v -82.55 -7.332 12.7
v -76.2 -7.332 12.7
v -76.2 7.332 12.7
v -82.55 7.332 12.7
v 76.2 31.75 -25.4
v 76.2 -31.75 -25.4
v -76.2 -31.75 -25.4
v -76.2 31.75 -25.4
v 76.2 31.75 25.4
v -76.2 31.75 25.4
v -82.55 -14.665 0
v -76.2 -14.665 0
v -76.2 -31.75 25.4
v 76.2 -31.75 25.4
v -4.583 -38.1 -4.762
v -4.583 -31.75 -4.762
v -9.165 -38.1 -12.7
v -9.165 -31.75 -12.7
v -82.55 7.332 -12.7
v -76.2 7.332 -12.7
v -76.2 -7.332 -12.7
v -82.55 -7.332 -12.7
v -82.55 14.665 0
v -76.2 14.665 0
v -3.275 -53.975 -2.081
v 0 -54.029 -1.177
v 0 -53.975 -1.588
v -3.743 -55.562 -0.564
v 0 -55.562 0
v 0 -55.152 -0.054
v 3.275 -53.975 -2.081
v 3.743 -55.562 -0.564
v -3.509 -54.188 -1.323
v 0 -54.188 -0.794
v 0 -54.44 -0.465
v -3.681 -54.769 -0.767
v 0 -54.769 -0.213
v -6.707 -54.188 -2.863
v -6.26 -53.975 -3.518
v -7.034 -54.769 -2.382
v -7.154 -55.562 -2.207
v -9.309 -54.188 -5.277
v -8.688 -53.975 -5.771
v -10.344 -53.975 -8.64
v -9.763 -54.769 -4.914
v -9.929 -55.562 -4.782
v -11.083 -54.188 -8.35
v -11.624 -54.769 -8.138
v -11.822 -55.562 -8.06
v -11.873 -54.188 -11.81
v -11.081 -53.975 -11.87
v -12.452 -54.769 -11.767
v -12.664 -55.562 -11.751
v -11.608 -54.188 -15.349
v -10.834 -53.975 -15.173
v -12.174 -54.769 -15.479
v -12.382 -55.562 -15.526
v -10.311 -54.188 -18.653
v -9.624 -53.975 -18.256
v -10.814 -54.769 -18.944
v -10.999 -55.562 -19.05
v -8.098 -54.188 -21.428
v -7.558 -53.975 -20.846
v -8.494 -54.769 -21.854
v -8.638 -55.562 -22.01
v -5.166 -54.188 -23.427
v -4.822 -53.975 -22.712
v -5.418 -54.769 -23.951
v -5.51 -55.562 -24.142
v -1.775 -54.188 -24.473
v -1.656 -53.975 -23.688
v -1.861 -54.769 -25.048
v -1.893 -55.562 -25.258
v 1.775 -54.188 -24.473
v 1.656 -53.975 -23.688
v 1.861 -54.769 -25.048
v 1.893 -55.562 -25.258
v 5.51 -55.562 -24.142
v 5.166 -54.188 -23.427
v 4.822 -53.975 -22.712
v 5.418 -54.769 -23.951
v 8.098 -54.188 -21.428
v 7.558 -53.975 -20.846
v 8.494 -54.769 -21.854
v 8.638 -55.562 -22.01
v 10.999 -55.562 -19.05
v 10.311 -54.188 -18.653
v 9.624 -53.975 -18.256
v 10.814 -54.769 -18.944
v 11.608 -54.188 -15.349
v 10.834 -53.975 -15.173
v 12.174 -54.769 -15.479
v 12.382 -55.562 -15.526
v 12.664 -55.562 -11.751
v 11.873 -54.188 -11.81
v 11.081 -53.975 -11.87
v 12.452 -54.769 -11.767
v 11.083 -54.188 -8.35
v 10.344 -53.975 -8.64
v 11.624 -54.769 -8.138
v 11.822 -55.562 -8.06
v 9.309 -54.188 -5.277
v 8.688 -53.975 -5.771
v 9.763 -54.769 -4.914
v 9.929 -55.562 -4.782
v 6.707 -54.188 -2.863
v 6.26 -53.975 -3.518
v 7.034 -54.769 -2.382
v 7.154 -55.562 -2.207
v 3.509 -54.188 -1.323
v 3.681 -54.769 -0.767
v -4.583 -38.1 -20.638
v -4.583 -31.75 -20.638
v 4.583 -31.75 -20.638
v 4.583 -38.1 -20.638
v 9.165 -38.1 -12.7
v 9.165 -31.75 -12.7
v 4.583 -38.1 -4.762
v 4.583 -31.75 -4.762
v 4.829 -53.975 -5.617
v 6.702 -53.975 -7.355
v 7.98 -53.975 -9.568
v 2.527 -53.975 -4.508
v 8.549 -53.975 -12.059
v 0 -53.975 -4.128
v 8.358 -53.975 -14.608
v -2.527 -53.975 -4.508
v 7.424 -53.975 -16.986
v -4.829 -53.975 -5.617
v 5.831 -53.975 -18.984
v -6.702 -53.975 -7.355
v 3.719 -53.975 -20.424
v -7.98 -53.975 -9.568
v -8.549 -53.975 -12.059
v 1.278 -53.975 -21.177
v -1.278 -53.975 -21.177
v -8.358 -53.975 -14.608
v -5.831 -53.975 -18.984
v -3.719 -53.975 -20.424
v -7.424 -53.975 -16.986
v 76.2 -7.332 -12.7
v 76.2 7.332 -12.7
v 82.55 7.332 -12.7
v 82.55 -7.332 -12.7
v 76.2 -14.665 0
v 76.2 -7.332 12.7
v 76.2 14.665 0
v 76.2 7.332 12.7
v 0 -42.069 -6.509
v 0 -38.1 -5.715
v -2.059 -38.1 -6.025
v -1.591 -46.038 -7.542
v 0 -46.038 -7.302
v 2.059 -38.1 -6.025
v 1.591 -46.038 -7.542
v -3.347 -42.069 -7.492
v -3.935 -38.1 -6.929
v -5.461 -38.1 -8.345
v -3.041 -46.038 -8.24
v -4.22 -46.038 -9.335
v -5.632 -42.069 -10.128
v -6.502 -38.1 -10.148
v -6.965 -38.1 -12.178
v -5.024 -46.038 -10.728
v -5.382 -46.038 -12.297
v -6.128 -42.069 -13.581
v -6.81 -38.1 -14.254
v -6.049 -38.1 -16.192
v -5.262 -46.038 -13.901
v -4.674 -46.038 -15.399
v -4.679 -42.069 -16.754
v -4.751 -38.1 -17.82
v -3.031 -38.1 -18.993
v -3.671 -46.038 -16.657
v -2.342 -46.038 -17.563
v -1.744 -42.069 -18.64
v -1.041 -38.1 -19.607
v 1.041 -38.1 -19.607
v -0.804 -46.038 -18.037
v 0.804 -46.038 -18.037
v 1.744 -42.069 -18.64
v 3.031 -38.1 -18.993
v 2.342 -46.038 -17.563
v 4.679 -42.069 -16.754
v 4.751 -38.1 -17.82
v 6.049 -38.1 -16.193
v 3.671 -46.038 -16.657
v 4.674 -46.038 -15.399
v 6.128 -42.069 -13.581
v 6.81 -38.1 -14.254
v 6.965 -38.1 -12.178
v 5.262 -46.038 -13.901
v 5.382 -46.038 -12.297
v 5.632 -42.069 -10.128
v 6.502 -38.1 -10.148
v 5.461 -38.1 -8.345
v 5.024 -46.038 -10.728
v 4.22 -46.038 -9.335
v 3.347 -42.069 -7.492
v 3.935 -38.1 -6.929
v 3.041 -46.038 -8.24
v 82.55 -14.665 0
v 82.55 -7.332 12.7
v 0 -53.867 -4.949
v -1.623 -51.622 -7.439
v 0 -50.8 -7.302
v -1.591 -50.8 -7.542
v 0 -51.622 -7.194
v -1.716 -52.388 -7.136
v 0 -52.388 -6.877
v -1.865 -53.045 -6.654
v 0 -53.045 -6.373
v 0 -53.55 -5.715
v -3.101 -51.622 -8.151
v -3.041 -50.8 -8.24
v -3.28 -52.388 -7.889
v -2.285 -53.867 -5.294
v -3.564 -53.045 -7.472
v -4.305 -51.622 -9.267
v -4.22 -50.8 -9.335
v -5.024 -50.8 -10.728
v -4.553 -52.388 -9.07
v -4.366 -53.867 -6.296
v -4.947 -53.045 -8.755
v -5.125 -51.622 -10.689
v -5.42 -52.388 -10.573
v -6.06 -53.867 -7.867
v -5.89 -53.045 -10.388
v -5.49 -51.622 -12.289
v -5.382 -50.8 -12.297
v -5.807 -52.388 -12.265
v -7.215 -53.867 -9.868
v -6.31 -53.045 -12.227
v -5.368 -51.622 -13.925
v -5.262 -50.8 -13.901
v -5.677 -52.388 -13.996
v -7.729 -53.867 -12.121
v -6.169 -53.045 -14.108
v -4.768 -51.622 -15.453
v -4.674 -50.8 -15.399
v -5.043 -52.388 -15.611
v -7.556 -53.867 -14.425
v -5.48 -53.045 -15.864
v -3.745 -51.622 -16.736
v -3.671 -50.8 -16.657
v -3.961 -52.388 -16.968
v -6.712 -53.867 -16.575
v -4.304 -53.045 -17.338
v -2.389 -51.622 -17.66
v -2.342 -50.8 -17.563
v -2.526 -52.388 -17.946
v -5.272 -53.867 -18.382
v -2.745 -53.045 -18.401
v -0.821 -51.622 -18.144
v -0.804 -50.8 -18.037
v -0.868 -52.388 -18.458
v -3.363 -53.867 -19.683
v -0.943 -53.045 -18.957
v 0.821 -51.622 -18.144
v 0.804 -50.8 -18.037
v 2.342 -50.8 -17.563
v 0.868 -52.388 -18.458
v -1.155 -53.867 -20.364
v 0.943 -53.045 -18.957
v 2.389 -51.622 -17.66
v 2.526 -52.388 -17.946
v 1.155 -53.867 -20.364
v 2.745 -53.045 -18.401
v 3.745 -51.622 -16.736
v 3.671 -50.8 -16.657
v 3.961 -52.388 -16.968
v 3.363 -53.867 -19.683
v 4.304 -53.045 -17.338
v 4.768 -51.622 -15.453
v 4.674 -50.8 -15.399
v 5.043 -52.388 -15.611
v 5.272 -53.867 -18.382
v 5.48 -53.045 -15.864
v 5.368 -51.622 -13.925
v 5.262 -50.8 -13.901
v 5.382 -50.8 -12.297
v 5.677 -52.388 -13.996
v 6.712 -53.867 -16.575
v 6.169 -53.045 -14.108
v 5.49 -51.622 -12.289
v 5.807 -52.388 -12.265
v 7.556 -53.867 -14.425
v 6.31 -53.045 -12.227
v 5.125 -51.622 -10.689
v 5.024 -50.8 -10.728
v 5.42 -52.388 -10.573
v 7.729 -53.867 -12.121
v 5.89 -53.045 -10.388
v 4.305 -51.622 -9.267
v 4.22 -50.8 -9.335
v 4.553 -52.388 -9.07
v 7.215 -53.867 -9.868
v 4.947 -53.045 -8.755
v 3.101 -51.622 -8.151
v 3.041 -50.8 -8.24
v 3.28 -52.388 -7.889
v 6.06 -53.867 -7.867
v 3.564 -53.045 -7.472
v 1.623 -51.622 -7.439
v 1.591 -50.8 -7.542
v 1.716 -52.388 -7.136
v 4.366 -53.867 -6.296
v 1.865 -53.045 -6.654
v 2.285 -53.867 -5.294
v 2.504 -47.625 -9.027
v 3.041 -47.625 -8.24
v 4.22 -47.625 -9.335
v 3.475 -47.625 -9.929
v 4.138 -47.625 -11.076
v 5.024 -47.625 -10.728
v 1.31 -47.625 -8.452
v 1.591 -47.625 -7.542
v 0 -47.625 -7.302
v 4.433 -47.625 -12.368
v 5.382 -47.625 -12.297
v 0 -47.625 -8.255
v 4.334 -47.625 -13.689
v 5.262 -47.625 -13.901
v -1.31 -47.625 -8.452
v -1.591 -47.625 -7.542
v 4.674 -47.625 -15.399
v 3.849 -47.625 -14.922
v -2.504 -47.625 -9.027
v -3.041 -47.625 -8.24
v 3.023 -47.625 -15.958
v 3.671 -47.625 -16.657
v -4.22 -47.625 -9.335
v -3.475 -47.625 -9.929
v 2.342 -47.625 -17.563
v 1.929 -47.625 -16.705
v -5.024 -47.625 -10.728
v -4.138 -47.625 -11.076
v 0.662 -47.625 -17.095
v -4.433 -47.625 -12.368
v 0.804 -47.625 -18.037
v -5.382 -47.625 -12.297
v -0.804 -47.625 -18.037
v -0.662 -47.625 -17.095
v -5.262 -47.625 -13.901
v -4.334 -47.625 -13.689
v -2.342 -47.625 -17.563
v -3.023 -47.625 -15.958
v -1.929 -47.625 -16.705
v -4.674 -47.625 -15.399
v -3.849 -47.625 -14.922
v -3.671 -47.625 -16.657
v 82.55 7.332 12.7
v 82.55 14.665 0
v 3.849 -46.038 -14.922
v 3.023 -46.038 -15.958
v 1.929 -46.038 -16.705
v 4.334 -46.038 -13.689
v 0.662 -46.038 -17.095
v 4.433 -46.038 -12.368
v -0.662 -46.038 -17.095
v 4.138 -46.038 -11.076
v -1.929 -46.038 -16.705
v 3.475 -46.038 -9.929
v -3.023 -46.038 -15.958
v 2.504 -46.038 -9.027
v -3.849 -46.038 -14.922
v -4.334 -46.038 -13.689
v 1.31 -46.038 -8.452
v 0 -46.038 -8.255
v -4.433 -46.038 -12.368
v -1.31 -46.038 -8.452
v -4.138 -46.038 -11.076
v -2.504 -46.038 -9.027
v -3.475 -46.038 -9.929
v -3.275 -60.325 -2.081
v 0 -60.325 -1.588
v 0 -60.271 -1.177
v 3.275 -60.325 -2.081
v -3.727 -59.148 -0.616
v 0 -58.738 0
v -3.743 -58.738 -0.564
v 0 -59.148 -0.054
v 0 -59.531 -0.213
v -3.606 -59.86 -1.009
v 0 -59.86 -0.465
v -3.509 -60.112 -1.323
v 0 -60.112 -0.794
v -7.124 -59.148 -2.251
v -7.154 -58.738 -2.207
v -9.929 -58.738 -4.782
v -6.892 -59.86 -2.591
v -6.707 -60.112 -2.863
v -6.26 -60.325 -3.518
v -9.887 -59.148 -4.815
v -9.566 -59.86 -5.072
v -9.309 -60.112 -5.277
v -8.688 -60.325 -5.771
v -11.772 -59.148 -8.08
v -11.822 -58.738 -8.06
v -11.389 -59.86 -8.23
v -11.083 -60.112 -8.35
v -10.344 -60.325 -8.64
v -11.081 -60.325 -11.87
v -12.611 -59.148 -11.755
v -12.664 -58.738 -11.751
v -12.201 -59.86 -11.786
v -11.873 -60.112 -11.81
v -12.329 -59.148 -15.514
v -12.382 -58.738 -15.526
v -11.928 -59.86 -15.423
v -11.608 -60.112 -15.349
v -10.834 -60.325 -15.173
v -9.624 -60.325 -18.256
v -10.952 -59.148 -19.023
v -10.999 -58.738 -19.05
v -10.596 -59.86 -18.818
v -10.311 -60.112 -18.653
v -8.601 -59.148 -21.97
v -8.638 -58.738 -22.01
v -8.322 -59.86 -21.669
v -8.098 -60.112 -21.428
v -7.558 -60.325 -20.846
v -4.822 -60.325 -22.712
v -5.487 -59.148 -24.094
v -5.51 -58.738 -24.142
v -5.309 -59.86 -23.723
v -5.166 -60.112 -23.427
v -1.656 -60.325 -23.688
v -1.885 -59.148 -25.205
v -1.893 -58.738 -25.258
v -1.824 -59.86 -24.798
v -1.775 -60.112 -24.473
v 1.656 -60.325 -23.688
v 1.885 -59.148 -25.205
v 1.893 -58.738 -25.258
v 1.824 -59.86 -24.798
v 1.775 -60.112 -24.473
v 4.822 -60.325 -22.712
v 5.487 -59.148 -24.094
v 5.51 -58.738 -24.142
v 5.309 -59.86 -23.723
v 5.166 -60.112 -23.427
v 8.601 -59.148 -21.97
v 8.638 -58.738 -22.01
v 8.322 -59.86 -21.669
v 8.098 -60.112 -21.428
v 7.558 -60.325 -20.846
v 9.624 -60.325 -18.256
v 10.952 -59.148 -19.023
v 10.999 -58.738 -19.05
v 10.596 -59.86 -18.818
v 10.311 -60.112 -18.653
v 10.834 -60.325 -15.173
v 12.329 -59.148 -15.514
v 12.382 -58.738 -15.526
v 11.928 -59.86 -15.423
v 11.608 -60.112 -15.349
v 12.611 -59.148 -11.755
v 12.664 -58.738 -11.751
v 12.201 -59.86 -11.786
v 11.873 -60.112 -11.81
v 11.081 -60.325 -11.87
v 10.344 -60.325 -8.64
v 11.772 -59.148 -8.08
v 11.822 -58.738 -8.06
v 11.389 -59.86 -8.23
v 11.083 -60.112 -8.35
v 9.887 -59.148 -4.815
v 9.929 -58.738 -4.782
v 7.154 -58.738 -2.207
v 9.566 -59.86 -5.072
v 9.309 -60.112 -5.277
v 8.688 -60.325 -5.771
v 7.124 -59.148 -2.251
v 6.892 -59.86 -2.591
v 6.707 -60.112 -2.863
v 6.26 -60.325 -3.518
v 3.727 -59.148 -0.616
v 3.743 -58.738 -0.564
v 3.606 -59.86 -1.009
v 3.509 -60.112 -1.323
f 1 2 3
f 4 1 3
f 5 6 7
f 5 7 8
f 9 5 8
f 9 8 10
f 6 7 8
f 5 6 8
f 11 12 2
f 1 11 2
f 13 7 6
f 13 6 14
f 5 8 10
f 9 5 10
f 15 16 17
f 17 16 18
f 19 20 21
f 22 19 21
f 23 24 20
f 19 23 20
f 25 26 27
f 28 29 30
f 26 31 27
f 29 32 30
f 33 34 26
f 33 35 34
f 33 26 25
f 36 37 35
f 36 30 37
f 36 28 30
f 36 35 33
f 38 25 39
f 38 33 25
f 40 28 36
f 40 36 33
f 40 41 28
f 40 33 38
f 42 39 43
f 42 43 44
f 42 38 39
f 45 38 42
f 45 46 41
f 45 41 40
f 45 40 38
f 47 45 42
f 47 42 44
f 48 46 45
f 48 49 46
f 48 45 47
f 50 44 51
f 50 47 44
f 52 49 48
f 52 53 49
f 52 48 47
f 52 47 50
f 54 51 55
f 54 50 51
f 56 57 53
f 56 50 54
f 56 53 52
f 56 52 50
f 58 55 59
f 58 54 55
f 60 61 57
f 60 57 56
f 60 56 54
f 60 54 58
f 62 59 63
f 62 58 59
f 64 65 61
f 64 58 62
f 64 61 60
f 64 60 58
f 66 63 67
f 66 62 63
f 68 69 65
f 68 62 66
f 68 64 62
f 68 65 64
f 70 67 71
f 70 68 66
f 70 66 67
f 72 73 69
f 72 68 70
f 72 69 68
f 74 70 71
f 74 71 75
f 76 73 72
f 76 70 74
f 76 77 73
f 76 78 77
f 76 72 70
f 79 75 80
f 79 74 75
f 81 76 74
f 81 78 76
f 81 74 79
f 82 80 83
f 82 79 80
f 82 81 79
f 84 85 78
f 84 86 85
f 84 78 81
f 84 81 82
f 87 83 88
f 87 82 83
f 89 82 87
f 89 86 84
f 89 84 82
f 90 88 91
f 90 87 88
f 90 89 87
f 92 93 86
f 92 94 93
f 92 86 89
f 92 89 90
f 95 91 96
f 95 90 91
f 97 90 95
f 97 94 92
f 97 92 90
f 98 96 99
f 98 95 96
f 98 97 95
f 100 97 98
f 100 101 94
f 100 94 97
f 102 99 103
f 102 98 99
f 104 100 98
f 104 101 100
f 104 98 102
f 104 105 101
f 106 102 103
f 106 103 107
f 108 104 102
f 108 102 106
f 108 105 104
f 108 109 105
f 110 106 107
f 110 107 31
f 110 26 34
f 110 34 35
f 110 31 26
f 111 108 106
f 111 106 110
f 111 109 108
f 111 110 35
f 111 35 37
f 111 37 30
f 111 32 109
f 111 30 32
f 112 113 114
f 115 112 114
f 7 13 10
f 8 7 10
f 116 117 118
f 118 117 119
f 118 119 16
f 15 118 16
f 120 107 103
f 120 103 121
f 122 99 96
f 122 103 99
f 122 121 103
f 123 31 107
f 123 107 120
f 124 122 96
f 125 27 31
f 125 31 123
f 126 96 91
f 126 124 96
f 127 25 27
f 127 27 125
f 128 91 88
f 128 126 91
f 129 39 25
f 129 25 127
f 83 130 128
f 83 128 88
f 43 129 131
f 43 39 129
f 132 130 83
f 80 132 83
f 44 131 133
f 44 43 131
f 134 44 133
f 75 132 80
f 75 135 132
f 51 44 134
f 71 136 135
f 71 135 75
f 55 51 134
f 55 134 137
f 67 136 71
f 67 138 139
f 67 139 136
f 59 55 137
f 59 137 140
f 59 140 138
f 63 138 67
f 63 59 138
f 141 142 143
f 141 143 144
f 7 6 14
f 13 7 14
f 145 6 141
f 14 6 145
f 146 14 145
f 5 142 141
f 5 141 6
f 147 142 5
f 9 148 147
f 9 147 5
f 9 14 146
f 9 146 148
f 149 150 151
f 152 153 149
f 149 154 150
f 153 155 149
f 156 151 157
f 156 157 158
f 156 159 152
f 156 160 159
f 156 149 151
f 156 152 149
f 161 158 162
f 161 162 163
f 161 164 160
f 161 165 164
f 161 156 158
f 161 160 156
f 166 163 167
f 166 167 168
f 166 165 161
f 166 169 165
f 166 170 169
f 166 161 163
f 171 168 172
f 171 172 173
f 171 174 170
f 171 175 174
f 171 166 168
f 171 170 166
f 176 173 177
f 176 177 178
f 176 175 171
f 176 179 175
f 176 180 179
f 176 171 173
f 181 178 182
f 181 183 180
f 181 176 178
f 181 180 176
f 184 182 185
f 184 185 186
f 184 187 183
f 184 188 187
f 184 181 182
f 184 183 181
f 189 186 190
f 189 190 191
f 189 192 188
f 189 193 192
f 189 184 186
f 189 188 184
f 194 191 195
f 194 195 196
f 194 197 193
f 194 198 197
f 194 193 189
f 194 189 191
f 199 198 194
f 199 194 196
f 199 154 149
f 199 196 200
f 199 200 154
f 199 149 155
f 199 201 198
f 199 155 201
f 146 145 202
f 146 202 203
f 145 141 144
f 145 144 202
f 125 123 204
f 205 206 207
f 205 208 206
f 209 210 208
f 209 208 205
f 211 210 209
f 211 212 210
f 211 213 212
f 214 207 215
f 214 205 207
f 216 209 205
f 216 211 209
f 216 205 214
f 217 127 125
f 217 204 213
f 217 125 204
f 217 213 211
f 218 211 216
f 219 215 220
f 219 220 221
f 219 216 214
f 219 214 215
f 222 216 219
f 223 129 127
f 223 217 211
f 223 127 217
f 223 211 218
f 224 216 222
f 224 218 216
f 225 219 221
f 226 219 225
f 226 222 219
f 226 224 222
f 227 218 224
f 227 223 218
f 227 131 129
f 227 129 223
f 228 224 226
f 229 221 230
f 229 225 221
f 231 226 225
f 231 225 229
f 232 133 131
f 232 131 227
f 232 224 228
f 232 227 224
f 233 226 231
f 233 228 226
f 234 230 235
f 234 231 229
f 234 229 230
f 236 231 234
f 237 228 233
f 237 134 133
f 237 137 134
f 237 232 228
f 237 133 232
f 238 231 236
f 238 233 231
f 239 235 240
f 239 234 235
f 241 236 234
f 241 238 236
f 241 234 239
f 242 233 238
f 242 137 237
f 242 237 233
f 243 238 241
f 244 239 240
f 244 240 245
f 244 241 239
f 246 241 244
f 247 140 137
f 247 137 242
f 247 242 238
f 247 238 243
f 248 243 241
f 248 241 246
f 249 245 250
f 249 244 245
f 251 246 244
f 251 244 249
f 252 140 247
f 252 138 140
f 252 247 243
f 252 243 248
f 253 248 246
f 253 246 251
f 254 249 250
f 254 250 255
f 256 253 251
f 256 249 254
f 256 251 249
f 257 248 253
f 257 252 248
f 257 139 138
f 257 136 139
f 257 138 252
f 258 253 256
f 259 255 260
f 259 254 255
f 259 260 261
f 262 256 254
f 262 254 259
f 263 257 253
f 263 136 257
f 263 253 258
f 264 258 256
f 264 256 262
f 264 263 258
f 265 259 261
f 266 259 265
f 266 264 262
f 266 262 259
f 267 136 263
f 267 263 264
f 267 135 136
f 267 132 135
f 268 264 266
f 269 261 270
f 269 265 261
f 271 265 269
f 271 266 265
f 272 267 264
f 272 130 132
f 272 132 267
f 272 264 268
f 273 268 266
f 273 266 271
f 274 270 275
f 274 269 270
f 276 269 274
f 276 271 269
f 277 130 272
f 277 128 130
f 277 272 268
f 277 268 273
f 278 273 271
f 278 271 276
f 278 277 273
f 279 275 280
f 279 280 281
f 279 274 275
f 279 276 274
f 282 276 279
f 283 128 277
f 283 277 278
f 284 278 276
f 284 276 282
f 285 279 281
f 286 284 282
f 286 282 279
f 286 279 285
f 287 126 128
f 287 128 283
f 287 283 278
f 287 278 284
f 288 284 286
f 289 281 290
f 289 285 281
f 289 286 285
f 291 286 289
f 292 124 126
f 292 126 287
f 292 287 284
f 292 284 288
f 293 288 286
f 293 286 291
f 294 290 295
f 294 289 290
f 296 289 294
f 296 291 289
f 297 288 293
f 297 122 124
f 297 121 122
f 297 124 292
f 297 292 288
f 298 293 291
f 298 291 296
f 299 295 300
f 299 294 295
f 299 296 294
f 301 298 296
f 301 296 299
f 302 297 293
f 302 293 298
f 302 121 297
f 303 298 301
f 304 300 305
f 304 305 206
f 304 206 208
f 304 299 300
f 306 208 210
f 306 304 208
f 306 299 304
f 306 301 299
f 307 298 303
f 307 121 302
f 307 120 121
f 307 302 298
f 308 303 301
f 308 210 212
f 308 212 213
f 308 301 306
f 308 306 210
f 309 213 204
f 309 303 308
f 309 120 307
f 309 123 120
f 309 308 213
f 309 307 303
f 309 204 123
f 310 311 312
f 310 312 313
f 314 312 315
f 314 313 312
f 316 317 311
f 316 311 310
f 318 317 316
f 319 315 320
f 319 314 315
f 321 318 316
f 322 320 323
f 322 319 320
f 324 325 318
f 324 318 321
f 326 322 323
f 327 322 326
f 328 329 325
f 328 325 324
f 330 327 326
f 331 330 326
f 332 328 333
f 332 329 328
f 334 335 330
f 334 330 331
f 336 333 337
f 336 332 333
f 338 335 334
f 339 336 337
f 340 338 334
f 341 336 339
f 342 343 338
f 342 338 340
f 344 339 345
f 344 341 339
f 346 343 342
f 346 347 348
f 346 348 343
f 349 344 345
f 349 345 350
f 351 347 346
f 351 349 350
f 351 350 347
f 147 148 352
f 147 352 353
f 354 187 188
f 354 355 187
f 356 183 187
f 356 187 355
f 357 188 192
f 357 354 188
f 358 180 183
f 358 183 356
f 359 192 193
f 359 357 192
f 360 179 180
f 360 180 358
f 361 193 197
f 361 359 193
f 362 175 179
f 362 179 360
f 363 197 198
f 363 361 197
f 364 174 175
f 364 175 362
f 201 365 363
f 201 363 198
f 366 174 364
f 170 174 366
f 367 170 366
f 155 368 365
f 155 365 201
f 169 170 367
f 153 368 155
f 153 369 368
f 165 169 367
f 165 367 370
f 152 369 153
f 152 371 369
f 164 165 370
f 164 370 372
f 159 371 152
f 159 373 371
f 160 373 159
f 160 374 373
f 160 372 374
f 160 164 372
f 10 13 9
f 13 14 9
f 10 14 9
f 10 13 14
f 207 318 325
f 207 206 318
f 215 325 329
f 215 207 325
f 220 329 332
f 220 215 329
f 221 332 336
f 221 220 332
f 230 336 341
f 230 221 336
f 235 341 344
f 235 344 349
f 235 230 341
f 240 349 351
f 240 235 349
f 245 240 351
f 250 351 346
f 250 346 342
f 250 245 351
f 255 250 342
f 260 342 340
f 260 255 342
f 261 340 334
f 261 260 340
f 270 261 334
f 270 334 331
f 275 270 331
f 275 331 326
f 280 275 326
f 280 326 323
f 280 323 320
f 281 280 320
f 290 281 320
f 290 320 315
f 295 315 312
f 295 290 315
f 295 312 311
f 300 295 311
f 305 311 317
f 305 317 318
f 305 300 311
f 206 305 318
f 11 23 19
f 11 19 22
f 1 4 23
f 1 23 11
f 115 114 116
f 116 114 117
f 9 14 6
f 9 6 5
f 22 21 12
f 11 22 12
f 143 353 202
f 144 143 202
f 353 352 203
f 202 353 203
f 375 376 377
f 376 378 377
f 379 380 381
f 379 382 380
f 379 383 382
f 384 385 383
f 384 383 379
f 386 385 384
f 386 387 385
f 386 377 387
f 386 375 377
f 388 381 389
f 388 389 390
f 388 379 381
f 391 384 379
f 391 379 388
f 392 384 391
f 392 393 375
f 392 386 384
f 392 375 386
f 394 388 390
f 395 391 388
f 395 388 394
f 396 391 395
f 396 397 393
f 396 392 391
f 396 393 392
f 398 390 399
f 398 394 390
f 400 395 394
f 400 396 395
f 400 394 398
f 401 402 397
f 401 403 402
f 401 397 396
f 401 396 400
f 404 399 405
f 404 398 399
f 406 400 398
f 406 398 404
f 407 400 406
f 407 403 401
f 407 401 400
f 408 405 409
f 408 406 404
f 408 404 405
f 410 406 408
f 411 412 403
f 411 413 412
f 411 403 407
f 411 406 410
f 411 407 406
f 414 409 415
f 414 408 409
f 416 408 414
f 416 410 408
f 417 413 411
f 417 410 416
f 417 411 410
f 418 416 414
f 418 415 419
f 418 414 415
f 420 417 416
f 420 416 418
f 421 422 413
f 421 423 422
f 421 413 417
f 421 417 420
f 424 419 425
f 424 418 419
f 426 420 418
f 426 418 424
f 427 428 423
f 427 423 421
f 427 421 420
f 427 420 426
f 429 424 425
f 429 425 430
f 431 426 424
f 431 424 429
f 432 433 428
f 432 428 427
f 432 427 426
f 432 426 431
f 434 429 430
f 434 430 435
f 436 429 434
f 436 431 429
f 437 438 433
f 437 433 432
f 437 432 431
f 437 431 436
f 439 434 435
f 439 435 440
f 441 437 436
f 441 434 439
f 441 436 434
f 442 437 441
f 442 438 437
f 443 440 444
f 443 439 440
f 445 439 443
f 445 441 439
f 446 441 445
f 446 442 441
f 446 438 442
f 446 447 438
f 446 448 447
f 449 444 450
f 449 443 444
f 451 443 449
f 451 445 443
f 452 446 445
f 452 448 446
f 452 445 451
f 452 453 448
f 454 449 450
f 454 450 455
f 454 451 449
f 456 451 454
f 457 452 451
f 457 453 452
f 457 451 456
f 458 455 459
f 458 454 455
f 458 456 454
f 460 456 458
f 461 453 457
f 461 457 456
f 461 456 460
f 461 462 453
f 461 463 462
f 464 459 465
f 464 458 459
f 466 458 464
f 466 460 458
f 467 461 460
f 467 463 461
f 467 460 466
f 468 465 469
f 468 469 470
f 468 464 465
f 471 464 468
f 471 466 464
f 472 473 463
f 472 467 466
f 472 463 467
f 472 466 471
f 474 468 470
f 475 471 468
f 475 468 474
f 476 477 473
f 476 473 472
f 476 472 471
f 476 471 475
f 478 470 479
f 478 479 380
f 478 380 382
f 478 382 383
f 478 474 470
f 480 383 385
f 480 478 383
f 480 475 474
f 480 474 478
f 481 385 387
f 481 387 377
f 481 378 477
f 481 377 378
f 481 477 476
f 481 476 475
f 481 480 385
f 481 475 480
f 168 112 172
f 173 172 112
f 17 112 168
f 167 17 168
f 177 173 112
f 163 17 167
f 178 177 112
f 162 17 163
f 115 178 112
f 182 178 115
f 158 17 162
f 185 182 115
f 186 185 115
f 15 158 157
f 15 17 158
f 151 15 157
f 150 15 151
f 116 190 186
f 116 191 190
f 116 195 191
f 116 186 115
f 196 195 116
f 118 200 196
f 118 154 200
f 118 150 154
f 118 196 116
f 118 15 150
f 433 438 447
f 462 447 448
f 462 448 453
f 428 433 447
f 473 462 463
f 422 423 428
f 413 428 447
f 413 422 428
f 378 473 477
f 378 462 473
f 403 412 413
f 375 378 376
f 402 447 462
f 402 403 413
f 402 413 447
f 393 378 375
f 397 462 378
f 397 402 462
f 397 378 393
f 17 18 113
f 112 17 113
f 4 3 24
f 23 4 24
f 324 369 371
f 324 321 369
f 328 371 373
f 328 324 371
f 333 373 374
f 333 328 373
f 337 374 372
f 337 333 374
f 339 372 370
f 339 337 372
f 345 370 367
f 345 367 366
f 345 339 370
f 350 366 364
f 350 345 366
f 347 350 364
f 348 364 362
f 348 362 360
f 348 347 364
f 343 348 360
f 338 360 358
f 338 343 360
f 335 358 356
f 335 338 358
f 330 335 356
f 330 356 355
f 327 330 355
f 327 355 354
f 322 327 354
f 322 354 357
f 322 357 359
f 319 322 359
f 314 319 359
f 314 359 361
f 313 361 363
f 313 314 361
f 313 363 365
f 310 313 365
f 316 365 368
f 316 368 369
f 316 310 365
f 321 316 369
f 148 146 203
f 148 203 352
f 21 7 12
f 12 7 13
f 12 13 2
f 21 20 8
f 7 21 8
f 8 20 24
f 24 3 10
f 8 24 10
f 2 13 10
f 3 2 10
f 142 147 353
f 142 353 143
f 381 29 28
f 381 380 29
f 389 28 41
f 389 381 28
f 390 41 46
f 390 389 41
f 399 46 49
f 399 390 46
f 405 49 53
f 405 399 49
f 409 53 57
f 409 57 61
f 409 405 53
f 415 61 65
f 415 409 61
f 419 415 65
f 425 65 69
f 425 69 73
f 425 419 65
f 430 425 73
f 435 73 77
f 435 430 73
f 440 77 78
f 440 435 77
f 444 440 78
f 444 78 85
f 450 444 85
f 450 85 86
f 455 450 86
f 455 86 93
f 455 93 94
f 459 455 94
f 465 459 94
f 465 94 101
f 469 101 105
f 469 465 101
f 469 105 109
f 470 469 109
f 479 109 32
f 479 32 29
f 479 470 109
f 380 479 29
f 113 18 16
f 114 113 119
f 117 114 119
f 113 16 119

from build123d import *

# Parameters (mm, degrees)
F0_W          = 63.5
F0_H          = 50.8
F1_DEPTH      = 76.2
F1_DEPTH_BACK = 76.2
F3_DEPTH      = 6.35
F8_DEPTH      = 6.35


# Not quite as in the source:
# - a feature names something its author has since deleted; it is built from what else it names
# - the program builds the solid bodies; features that only make, move or delete a surface that nothing else refers to are left out


with BuildPart() as f1:
    # F0 (on Right) → F1 (new body, two sides)
    with BuildSketch(Plane.YZ) as f1_sk:
        Rectangle(F0_W, F0_H)
    extrude(amount=F1_DEPTH)
    extrude(f1_sk.sketch, amount=-F1_DEPTH_BACK)

    # F2 (on face) → F3 (join)
    with BuildSketch(Plane(origin=(-76.2, 0, 0), x_dir=(0, -1, 0), z_dir=(-1, 0, 0))):
        Polygon((7.3323484187, 12.7), (-7.3323484187, 12.7), (-14.6646968374, 0), (-7.3323484187, -12.7), (7.3323484187, -12.7), (14.6646968374, 0), align=None)
    extrude(amount=F3_DEPTH)


with BuildPart() as f6_1:
    # F6: instance of F1
    add(f1.part.mirror(Plane.YZ))


with BuildPart() as f8:
    # F7 (on face) → F8 (new body)
    with BuildSketch(Plane.XZ.offset(31.75)):
        Polygon((9.1654355234, -12.7), (4.5827177617, -4.7625), (-4.5827177617, -4.7625), (-9.1654355234, -12.7), (-4.5827177617, -20.6375), (4.5827177617, -20.6375), align=None)
    extrude(amount=F8_DEPTH)

    # F9 (on Right) → F10 (revolve)
    with BuildSketch(Plane.YZ):
        with BuildLine():
            Line((-38.1, -12.7), (-38.1, -5.715))
            Line((-38.1, -5.715), (-46.0375, -7.3025))
            Line((-46.0375, -7.3025), (-46.0375, -8.255))
            Line((-46.0375, -8.255), (-47.625, -8.255))
            Line((-47.625, -8.255), (-47.625, -7.3025))
            Line((-47.625, -7.3025), (-50.8, -7.3025))
            ThreePointArc((-50.8, -7.3025), (-53.0450640303, -6.3725640303), (-53.975, -4.1275))
            Line((-53.975, -4.1275), (-53.975, -1.5875))
            ThreePointArc((-53.975, -1.5875), (-54.4399679849, -0.4649679849), (-55.5625, 0))
            Line((-55.5625, 0), (-58.7375, 0))
            ThreePointArc((-58.7375, 0), (-59.8600320151, -0.4649679849), (-60.325, -1.5875))
            Line((-60.325, -1.5875), (-60.325, -12.7))
            Line((-60.325, -12.7), (-38.1, -12.7))
        make_face()
    revolve(axis=Axis((0, -65.4494816124, -12.7), (0, -1, 0)))


solid = Compound([f1.part, f6_1.part, f8.part])
